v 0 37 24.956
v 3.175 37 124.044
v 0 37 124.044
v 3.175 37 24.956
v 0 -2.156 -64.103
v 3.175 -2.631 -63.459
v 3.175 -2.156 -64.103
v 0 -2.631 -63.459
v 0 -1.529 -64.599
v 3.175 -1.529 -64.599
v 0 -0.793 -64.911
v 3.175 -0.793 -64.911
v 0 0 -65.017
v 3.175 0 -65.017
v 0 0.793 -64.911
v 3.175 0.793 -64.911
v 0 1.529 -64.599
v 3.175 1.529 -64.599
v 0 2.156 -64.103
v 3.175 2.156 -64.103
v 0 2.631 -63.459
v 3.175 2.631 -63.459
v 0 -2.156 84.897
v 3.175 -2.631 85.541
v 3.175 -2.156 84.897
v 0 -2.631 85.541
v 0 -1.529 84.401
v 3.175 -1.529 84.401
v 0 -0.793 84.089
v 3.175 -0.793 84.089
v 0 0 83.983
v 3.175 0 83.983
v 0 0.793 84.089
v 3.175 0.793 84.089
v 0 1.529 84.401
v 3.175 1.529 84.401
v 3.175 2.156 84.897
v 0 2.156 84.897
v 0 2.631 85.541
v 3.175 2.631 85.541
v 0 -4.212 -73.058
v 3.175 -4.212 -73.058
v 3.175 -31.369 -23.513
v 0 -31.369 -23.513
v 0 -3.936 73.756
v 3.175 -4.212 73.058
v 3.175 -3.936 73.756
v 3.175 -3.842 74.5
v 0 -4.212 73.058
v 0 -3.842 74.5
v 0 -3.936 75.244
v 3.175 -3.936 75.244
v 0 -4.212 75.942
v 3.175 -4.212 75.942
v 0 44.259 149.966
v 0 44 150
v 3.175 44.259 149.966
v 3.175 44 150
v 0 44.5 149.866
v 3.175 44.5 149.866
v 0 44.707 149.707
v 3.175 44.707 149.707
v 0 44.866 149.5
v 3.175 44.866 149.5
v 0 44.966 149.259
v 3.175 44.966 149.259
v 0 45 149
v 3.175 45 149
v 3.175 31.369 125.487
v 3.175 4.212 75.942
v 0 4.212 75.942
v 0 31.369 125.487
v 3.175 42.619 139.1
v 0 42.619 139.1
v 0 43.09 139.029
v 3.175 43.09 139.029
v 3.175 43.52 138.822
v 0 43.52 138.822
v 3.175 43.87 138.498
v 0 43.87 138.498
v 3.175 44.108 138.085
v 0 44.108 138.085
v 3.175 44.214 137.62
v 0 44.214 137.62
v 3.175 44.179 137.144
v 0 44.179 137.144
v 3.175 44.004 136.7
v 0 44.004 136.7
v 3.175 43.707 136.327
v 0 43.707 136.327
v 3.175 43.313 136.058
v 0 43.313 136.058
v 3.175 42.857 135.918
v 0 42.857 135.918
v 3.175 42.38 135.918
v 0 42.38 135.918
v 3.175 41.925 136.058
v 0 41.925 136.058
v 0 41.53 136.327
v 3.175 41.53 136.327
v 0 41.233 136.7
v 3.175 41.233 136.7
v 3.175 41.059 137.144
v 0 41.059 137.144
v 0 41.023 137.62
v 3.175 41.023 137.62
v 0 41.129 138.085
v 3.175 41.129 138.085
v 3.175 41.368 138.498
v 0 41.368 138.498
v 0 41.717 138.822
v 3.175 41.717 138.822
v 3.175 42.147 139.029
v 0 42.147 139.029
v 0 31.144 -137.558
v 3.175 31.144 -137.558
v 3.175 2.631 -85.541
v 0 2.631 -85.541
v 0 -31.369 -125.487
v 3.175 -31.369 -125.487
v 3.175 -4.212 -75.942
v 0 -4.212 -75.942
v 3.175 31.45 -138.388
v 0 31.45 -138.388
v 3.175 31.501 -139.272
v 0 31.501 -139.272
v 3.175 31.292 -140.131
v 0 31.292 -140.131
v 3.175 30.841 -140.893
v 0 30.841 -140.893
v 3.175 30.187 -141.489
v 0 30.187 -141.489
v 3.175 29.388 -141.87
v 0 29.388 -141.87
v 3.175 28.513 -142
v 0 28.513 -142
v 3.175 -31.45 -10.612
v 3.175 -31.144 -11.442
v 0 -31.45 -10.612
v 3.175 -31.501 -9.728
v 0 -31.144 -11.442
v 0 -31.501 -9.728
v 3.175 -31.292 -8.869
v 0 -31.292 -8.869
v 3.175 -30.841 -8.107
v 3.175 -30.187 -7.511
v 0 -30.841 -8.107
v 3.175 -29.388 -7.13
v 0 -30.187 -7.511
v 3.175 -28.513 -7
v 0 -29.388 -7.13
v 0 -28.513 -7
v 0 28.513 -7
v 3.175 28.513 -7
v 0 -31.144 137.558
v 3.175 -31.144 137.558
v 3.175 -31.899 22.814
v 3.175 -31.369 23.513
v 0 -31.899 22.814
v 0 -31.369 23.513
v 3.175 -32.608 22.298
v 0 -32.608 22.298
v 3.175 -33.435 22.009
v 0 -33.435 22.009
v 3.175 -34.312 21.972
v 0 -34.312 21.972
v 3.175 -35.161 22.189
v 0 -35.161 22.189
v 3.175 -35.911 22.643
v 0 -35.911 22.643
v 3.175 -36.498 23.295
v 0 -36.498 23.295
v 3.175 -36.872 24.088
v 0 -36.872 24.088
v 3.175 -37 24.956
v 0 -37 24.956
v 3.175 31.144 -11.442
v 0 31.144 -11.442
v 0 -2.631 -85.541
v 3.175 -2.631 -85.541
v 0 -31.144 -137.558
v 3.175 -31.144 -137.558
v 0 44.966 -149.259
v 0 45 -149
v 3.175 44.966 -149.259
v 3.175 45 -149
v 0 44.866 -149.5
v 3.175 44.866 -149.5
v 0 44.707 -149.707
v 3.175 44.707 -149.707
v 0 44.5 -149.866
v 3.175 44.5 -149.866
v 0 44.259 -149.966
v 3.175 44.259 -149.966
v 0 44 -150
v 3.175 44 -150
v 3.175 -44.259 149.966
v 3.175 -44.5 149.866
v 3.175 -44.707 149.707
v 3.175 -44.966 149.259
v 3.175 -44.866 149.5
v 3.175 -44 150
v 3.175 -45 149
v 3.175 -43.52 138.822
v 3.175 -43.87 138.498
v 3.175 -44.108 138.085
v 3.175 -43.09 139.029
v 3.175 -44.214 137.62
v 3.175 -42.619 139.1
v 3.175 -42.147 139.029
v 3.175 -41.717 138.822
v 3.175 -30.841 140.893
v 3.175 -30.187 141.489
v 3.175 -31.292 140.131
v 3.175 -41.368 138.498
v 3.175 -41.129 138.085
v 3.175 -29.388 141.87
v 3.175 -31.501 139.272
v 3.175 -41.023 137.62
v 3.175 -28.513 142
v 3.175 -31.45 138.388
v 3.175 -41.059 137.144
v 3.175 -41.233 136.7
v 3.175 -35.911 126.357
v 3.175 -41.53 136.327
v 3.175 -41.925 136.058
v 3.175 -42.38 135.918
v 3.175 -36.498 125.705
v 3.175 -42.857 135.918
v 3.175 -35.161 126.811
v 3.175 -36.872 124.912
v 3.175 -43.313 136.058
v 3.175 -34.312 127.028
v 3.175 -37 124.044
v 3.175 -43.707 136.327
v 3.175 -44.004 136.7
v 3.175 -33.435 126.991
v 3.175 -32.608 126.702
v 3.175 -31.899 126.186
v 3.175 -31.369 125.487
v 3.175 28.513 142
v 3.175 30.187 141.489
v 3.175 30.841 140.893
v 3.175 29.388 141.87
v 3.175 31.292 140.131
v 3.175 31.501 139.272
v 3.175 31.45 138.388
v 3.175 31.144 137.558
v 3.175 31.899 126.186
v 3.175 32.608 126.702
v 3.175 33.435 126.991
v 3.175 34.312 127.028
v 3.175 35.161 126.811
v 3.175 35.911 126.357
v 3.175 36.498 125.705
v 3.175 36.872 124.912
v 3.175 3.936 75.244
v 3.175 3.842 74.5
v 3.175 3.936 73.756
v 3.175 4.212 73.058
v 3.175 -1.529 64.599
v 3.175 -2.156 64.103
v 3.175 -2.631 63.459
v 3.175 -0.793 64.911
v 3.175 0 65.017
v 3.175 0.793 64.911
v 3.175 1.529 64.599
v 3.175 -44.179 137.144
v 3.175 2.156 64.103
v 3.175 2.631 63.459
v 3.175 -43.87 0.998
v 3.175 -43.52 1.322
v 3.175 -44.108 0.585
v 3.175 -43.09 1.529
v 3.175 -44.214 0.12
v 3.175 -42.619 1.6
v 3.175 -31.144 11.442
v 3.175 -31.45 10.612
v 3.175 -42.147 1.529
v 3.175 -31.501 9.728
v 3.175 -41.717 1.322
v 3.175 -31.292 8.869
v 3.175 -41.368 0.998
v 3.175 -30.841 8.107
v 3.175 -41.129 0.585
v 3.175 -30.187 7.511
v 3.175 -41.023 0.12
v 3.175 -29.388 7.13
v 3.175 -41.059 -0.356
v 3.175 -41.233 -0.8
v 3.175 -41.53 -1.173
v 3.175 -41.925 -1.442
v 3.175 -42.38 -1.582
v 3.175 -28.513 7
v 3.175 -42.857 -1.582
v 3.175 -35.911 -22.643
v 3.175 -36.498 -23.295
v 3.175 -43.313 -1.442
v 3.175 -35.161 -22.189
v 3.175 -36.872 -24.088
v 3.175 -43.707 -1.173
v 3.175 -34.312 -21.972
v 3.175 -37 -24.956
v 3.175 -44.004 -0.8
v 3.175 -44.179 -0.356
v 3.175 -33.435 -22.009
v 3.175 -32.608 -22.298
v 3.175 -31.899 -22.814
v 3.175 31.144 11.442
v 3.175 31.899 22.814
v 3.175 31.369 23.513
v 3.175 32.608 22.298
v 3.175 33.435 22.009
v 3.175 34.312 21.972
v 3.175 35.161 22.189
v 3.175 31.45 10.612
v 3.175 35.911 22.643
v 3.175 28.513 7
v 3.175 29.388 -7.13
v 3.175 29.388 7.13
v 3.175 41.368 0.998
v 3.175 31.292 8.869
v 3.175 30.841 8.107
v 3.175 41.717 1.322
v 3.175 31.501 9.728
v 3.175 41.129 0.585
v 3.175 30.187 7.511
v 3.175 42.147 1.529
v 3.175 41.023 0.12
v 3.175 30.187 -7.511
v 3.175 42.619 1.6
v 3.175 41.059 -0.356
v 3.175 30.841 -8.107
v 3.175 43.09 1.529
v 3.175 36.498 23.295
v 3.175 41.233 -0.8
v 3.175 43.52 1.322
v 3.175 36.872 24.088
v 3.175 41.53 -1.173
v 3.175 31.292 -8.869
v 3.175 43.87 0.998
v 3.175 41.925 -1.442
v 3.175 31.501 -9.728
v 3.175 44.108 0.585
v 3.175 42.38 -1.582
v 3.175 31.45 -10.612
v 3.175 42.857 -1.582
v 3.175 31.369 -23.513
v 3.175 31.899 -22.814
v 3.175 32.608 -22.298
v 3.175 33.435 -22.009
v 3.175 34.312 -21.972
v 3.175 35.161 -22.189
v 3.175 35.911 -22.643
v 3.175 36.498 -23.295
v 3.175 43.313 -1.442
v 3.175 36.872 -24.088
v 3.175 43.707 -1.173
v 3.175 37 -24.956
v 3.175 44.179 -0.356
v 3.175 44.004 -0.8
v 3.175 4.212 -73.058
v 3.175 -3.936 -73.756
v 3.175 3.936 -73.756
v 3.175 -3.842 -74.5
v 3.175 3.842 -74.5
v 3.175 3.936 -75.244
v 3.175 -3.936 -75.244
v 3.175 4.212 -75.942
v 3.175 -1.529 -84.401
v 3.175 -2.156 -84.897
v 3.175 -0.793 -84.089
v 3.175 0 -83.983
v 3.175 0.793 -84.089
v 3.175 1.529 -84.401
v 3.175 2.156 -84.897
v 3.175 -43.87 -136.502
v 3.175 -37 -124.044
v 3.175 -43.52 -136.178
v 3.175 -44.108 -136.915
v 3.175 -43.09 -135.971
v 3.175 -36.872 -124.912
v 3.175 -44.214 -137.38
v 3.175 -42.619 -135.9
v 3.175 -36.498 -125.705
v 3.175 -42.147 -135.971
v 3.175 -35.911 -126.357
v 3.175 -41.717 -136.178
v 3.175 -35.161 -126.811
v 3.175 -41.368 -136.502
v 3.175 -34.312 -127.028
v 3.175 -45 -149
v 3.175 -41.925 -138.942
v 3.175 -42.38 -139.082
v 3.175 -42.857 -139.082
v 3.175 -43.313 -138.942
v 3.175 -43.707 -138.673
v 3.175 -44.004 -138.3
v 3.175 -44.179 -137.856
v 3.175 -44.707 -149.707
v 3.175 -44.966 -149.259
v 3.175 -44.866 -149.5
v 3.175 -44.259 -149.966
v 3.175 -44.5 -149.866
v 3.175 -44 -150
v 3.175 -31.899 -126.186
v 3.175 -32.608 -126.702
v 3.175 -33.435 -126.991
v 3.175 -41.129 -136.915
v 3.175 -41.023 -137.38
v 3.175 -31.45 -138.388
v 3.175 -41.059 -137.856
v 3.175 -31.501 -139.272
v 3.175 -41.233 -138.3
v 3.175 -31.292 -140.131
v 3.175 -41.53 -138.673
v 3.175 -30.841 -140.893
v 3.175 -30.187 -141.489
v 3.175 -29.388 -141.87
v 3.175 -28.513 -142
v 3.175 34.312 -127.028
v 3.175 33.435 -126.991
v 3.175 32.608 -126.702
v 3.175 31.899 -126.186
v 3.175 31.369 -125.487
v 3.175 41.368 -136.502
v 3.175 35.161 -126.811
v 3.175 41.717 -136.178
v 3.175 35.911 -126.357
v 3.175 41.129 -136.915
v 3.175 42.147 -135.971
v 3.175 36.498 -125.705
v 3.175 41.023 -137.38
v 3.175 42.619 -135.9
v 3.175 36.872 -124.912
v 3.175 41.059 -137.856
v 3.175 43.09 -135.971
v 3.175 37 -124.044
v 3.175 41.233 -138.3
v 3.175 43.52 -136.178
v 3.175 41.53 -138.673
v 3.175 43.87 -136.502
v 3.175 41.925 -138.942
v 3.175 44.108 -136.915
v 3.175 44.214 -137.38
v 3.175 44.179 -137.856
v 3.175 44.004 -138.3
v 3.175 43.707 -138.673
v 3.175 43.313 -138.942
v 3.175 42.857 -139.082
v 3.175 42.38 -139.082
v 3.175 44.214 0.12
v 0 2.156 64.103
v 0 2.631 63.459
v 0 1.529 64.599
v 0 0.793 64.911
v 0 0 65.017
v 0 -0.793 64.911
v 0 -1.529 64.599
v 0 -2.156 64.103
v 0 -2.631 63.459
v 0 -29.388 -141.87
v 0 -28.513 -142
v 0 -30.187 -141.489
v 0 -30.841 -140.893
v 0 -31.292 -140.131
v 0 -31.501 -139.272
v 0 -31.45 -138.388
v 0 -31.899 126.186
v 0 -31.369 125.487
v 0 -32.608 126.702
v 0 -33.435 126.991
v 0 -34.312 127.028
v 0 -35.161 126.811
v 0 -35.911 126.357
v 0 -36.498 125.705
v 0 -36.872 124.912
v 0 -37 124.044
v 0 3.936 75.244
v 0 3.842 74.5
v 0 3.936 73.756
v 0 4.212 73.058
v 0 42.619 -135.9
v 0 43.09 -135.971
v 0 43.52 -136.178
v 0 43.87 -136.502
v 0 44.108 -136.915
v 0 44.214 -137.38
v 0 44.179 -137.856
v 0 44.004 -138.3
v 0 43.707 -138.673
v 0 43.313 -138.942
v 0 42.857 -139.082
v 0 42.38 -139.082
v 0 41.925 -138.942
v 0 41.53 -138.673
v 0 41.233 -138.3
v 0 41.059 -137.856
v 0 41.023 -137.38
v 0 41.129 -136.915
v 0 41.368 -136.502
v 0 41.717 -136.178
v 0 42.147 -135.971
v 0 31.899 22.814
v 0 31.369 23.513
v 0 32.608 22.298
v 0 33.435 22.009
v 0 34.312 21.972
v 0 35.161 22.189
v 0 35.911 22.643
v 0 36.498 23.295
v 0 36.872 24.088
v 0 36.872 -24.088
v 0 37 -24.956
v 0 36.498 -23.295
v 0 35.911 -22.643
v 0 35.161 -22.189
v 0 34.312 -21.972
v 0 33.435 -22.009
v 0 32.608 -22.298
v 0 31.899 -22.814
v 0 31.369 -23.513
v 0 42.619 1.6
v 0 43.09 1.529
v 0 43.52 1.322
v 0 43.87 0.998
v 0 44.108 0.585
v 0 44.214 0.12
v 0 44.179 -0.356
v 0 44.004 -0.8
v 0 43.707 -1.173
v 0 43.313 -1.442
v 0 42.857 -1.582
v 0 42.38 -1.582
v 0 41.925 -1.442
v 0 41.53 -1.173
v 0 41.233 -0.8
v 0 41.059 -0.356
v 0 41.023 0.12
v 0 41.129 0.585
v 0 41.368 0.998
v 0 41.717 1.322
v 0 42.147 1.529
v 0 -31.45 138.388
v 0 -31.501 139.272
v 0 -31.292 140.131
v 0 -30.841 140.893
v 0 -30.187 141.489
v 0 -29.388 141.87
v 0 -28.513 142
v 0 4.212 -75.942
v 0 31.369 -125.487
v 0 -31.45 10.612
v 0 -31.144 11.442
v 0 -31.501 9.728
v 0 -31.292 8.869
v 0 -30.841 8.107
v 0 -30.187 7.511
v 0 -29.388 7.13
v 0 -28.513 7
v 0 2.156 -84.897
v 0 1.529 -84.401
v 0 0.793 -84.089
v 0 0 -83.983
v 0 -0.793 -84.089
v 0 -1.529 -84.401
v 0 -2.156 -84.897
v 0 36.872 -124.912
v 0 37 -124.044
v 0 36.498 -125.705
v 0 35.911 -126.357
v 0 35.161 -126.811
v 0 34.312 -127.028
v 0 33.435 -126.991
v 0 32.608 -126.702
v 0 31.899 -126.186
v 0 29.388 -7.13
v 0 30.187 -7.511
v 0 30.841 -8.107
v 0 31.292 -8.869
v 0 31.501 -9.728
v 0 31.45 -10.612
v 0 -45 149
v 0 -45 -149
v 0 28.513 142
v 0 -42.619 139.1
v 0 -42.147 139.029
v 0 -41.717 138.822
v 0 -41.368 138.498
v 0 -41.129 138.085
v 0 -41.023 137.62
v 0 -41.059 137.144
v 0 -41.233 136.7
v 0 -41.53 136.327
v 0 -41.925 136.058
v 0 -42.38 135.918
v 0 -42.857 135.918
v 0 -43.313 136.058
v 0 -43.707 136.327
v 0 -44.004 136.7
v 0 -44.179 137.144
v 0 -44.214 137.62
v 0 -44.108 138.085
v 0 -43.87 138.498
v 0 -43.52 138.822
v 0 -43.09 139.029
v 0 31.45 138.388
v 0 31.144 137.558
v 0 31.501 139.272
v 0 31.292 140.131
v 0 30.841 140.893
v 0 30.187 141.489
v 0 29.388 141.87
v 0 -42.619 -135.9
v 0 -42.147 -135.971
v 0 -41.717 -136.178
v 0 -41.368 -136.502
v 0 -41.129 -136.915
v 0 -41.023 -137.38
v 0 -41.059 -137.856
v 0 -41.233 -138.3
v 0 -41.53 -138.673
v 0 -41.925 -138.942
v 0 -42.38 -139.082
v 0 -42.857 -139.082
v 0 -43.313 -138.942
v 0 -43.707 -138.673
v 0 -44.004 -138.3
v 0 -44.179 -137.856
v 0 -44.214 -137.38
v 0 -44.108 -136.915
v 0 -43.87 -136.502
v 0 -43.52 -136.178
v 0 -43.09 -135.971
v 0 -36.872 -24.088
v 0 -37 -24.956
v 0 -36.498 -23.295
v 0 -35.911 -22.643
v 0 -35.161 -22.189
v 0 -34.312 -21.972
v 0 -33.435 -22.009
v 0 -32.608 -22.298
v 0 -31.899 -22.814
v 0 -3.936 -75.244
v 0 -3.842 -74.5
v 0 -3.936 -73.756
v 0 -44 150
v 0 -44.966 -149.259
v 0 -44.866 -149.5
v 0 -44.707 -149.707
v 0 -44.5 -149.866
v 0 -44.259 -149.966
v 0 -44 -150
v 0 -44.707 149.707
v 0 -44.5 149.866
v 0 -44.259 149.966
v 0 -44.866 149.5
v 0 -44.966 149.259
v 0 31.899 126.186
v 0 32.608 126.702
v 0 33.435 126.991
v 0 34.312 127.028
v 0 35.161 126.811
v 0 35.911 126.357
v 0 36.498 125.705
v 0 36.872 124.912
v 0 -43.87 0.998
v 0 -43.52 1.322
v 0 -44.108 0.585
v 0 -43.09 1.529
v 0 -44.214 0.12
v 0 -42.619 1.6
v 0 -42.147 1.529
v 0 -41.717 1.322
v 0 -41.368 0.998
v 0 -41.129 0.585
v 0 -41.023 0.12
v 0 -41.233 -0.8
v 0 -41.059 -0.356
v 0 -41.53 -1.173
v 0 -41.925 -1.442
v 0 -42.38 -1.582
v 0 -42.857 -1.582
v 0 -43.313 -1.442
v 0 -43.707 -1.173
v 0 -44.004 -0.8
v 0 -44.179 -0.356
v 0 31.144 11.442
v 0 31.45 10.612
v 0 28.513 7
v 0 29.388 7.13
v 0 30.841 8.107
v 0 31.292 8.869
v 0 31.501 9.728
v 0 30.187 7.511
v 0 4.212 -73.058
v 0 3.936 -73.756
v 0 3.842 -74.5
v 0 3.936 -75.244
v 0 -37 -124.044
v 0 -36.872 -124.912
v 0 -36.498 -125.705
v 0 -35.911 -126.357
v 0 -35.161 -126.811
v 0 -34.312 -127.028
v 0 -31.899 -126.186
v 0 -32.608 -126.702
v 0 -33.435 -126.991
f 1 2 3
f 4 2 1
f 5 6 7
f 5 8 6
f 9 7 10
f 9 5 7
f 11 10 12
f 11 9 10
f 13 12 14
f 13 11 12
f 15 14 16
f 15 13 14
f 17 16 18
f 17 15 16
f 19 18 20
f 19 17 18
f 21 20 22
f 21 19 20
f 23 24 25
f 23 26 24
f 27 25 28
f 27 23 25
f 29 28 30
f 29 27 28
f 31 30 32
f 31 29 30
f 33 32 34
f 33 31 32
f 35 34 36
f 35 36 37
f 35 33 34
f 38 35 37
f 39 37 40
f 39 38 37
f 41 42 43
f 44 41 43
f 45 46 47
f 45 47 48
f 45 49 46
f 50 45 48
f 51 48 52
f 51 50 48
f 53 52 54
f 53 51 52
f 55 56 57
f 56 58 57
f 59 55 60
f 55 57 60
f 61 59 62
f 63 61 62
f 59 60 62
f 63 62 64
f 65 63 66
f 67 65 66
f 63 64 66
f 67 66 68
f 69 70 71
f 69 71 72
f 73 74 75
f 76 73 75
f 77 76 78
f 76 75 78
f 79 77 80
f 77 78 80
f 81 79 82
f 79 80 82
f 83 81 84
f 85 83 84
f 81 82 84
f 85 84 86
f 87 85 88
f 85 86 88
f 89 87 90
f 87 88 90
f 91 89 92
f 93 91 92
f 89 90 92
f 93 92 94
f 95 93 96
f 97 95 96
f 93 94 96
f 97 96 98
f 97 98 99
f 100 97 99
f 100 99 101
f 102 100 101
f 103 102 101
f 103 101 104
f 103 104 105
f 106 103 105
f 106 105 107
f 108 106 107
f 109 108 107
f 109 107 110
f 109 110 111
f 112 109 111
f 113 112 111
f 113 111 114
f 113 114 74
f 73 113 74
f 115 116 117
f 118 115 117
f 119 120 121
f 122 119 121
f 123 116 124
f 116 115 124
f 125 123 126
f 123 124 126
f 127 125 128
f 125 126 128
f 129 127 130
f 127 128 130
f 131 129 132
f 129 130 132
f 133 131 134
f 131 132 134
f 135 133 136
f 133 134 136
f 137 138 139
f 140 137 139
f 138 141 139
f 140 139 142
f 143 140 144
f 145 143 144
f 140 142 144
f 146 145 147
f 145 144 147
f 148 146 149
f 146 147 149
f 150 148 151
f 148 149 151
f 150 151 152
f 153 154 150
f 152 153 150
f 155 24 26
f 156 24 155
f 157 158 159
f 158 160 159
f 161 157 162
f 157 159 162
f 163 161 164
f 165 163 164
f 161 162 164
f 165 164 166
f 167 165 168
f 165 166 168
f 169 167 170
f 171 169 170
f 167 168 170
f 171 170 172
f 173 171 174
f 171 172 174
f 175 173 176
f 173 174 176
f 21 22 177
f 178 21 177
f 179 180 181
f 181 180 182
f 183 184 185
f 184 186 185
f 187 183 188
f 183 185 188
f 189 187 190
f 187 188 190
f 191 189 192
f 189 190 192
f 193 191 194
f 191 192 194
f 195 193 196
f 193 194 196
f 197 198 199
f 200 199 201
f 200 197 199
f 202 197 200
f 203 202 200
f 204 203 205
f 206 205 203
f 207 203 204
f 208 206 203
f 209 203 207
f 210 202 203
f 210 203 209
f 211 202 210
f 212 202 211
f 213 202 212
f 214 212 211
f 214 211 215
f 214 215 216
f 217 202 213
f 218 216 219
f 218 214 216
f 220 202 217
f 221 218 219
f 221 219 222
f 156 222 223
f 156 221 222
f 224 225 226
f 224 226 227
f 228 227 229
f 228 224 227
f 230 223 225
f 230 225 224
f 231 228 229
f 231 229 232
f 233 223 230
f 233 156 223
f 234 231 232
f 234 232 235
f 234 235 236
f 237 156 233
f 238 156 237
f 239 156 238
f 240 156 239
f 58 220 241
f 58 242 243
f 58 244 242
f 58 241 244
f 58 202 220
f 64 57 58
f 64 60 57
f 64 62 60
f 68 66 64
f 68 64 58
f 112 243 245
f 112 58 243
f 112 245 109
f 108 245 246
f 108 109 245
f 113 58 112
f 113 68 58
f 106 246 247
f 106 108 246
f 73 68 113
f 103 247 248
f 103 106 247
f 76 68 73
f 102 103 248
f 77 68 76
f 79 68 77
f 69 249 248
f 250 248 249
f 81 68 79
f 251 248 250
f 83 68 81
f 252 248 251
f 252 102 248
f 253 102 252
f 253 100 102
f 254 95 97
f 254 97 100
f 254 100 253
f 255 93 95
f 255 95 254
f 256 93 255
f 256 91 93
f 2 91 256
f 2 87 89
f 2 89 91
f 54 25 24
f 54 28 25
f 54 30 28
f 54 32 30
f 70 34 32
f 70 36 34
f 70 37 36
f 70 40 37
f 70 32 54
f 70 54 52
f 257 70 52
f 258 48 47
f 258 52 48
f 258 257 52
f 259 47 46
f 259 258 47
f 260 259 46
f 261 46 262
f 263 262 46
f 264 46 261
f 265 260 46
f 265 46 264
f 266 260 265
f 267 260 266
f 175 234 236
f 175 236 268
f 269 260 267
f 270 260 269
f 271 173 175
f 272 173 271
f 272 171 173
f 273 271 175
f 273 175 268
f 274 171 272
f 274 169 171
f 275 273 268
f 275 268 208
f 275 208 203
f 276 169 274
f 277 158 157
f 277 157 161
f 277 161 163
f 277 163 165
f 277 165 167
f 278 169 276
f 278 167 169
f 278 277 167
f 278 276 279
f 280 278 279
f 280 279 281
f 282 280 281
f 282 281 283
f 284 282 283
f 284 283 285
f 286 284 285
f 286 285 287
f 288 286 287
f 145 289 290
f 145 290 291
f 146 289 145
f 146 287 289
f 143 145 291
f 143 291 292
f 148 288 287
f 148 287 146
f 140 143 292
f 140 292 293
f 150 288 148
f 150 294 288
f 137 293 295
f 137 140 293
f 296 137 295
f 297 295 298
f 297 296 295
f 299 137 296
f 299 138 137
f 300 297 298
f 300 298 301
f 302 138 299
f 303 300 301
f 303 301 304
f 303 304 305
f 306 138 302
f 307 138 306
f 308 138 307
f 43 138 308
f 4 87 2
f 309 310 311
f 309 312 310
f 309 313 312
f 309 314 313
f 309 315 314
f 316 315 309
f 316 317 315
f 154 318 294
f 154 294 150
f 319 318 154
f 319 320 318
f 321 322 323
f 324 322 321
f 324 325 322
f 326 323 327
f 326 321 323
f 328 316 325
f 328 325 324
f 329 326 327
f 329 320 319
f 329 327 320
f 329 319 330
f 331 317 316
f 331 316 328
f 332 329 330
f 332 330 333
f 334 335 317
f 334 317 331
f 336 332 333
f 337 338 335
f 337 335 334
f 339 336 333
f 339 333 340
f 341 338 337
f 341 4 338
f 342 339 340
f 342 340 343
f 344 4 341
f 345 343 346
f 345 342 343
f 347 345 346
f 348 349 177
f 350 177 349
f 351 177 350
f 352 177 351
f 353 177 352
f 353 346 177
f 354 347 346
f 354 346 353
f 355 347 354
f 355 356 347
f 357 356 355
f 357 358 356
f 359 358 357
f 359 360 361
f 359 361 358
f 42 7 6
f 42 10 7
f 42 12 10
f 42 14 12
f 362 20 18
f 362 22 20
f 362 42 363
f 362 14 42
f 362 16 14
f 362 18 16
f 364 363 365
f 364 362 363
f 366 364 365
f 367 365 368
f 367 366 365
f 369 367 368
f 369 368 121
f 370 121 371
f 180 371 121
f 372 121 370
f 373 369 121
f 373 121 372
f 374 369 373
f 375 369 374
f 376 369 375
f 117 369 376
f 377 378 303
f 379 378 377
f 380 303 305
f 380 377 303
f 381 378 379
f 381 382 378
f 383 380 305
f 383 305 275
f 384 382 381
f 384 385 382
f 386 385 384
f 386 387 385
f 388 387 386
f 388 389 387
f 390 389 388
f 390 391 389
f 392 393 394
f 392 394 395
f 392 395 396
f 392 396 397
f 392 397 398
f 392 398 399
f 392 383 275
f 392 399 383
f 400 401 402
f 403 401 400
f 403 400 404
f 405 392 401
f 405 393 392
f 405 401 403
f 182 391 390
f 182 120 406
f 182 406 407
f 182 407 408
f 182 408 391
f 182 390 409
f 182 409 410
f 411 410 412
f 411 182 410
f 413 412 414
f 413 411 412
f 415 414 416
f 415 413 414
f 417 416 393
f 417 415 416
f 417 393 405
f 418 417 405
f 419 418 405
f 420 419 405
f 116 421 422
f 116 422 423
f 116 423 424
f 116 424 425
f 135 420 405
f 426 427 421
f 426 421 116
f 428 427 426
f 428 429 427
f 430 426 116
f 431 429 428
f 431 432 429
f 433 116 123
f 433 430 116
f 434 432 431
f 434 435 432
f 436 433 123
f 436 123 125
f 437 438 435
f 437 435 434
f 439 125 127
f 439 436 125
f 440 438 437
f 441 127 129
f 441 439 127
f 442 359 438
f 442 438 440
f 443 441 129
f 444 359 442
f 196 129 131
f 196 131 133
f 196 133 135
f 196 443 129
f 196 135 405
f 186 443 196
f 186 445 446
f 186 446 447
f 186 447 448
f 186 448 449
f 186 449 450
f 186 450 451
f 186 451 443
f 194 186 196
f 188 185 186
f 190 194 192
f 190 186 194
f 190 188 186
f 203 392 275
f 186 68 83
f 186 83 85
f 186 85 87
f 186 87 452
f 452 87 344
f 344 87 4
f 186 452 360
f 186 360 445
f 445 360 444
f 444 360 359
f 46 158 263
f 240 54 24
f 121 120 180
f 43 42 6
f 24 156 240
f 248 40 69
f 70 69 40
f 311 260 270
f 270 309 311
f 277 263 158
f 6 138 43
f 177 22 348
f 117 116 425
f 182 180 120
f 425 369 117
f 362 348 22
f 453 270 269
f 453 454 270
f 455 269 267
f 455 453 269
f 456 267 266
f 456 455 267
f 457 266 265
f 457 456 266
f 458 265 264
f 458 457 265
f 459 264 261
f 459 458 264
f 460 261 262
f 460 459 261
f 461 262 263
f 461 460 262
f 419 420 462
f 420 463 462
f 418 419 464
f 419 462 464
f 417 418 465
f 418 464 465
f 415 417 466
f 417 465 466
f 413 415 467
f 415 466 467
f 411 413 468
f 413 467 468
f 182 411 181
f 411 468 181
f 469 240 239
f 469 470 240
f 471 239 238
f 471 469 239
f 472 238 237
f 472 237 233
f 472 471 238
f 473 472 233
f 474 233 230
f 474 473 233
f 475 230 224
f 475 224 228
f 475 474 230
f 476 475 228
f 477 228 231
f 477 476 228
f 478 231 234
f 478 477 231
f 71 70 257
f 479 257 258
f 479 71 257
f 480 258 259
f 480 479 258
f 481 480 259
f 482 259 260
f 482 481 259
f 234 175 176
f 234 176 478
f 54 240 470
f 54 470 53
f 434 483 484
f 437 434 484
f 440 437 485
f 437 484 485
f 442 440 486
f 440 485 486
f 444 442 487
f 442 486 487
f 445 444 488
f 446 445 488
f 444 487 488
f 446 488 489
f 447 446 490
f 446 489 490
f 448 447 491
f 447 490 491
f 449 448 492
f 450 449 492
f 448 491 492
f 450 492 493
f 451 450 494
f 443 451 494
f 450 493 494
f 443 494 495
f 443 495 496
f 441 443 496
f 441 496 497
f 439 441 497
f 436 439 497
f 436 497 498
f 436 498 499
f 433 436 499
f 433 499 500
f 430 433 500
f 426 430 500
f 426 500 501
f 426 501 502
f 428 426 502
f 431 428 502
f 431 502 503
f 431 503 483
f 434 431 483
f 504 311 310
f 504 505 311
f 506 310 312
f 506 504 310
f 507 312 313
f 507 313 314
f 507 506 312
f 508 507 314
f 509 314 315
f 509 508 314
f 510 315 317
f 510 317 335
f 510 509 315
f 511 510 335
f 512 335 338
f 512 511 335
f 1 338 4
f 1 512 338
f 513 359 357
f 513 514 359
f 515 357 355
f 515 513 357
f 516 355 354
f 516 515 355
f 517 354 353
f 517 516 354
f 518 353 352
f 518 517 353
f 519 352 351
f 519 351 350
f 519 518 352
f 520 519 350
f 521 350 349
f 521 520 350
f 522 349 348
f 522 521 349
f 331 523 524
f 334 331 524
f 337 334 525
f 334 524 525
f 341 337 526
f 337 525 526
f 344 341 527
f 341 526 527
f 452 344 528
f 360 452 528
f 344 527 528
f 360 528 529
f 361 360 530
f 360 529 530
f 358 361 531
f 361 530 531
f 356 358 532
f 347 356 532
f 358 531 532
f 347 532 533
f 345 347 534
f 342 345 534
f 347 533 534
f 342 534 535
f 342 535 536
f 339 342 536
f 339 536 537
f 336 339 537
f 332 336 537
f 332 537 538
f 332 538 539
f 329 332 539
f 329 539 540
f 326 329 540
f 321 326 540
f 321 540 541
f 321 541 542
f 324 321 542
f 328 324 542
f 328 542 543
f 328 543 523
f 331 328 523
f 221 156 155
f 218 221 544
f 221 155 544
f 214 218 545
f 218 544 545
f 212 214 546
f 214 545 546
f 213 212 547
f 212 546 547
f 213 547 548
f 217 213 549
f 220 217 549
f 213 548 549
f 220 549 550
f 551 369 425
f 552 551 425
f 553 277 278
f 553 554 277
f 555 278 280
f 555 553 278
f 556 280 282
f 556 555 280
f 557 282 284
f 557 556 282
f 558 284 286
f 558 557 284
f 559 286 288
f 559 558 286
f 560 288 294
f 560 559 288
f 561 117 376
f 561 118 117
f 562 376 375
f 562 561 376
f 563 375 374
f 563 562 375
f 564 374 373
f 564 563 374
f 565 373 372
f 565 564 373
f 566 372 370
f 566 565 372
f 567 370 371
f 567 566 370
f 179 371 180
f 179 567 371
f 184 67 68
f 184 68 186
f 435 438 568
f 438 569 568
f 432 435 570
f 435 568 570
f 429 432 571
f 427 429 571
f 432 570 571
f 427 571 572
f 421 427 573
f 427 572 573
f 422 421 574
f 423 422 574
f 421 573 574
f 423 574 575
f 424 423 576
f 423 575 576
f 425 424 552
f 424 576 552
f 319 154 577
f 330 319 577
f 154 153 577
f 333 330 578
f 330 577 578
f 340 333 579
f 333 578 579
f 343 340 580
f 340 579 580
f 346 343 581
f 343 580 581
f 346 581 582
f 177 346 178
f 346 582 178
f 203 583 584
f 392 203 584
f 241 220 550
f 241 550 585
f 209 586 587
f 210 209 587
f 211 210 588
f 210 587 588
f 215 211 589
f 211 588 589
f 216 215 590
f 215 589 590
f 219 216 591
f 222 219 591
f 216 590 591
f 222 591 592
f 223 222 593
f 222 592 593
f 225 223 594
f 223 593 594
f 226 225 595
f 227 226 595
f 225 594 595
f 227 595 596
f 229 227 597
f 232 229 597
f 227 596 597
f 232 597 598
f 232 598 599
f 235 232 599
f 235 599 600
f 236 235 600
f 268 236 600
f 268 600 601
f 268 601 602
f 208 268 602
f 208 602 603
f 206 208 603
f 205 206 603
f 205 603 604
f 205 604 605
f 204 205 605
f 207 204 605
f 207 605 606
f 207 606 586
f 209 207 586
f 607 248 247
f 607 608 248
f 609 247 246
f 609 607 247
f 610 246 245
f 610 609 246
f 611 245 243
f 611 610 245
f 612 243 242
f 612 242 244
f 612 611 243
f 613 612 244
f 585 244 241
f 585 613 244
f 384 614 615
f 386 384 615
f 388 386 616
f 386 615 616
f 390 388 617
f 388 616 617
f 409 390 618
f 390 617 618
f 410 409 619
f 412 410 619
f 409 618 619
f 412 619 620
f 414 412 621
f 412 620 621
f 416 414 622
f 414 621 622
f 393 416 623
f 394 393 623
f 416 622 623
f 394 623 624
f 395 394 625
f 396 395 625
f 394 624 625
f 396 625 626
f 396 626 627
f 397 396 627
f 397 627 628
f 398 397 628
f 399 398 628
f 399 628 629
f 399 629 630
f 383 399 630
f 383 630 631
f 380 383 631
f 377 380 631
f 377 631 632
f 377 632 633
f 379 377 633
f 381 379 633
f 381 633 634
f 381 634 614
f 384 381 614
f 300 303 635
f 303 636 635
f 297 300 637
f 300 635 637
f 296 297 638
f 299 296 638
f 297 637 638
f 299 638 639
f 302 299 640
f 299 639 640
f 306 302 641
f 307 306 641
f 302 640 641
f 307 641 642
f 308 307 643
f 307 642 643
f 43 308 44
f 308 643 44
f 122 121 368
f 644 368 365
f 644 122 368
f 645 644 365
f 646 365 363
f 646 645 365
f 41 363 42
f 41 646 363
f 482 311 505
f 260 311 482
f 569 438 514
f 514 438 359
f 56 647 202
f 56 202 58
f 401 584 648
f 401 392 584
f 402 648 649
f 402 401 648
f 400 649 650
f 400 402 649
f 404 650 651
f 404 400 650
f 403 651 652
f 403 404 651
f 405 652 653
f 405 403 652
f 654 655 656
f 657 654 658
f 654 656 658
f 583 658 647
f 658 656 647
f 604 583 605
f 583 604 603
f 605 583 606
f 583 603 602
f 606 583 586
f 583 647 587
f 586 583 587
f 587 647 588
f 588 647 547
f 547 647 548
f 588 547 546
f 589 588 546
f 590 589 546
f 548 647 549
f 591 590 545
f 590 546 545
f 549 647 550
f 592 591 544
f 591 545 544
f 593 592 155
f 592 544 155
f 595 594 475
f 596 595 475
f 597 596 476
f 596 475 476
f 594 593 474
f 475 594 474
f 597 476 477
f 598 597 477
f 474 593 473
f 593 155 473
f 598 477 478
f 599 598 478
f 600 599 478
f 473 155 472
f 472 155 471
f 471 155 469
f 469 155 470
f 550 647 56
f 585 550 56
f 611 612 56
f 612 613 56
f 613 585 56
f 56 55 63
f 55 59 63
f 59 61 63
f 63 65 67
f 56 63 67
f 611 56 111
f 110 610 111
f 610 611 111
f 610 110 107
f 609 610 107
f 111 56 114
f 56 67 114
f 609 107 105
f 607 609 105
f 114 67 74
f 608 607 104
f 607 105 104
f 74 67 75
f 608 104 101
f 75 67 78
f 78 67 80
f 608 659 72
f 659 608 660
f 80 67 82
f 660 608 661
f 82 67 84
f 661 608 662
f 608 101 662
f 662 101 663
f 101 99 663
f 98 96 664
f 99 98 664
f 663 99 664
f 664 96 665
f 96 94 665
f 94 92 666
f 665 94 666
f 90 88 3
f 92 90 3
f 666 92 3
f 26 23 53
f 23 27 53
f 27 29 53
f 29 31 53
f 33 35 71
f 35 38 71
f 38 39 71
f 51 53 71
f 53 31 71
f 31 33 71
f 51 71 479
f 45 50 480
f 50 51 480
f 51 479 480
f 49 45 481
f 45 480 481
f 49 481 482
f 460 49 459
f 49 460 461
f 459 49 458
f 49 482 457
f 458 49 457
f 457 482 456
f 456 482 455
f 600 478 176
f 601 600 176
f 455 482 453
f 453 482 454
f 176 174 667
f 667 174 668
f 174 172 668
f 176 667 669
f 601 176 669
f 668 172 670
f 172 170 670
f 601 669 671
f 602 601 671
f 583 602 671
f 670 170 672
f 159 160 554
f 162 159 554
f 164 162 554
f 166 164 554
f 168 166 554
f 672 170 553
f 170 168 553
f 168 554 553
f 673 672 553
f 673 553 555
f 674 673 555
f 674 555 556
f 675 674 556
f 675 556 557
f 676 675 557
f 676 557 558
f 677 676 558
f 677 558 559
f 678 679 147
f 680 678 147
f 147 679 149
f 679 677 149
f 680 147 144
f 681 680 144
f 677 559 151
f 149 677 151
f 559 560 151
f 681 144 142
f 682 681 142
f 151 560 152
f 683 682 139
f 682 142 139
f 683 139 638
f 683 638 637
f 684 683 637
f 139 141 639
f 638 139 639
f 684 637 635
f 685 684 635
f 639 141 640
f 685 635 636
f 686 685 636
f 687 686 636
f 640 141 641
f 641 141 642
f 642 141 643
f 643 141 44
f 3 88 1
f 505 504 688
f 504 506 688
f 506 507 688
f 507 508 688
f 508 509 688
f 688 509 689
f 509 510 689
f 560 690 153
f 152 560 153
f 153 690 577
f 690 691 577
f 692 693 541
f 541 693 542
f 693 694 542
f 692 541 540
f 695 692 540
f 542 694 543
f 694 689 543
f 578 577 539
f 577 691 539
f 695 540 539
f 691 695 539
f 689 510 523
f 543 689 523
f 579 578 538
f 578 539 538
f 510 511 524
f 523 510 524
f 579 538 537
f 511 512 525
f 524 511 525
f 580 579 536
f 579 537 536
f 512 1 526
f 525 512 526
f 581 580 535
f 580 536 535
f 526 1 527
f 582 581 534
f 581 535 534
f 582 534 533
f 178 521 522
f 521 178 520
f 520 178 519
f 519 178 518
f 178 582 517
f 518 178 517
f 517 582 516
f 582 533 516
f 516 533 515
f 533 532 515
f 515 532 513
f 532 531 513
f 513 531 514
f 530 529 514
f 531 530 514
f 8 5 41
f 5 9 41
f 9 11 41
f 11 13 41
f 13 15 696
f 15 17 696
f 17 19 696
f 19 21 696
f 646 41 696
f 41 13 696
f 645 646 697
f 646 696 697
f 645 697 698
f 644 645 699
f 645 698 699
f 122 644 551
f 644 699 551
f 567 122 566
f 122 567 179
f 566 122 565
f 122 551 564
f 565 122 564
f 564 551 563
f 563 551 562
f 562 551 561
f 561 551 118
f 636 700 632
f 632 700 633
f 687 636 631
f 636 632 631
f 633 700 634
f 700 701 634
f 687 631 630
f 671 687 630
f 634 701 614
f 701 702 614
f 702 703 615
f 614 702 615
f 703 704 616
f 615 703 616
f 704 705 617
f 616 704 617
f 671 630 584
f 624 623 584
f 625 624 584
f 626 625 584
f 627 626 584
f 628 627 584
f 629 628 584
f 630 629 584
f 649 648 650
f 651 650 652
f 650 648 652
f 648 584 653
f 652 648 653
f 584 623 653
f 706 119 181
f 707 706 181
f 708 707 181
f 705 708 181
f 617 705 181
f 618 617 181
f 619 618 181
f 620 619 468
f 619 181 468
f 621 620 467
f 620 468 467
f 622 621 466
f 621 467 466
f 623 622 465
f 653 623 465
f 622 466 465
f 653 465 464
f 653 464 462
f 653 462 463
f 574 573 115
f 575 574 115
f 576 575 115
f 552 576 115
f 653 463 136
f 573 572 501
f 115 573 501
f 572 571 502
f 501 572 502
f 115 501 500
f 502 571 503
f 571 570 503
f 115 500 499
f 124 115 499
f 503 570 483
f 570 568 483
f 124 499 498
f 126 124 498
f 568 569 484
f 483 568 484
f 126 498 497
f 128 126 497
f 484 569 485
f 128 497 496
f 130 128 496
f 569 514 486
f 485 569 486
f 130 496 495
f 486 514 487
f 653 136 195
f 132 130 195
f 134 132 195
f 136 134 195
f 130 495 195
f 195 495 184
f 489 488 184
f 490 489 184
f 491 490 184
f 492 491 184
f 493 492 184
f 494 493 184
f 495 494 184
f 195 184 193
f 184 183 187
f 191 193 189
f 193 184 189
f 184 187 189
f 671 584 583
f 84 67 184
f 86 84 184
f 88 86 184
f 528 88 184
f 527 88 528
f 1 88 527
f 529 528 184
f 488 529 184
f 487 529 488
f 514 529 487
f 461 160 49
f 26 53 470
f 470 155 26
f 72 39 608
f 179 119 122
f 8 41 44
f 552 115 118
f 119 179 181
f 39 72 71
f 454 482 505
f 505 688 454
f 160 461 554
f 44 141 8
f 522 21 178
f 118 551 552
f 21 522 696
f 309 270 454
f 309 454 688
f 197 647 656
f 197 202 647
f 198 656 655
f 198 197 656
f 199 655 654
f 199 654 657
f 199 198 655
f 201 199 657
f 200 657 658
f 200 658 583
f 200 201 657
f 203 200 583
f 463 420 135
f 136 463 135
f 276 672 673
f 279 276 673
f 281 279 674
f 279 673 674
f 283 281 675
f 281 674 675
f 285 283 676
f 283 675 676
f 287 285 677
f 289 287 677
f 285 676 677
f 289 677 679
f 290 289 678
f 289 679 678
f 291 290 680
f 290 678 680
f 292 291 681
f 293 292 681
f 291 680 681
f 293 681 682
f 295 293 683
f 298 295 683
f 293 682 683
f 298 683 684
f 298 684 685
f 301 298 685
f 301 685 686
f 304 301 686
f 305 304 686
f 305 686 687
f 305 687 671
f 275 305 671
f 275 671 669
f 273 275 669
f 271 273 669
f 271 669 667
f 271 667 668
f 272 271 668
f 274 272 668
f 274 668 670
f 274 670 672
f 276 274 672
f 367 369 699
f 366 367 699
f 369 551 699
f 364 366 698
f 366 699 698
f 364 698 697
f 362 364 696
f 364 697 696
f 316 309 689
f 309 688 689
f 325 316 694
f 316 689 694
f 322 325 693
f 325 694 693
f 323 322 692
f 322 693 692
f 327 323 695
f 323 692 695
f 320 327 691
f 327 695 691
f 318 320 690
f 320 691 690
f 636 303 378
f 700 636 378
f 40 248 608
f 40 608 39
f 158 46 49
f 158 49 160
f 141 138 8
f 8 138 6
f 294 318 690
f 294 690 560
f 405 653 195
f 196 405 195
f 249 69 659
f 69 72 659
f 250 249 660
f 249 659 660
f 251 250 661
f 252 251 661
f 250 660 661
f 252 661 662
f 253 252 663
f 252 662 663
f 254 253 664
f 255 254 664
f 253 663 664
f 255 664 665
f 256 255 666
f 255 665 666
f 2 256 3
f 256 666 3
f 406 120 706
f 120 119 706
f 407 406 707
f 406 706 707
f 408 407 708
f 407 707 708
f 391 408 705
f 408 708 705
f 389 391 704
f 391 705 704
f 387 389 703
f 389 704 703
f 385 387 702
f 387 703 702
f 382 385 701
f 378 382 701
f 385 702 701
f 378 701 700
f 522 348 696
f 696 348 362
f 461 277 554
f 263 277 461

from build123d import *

# Parameters (mm, degrees)
SKETCH2_W            = 300
SKETCH2_H            = 90
BOSS_EXTRUDE1_DEPTH  = 3.175
CUT_EXTRUDE2_DEPTH   = 157.636779286
M3_CLEARANCE_HOLE1_D = 3.2
FILLET1_R            = 3
FILLET2_R            = 1


with BuildPart() as part:
    # Sketch2 → Boss-Extrude1 (new body)
    with BuildSketch(Plane(origin=(0, 0, 0), x_dir=(0, 0, -1), z_dir=(1, 0, 0))):
        Rectangle(SKETCH2_W, SKETCH2_H)
    extrude(amount=BOSS_EXTRUDE1_DEPTH)

    # Sketch4 → Cut-Extrude2 (cut, through all)
    with BuildSketch(Plane(origin=(3.175, 0, 0), x_dir=(0, 0, -1), z_dir=(1, 0, 0))):
        Polygon((-135.758731446, 37), (-13.241268554, 37), (-74.5, 3.4211398), align=None)
        Polygon((-7, 33.5788602), (-7, -33.5788602), (-68.258731446, 0), align=None)
        Polygon((-13.241268554, -37), (-135.758731446, -37), (-74.5, -3.4211398), align=None)
        Polygon((-142, -33.5788602), (-142, 33.5788602), (-80.741268554, 0), align=None)
        Polygon((135.758731446, 37), (13.241268554, 37), (74.5, 3.4211398), align=None)
        Polygon((142, 33.5788602), (80.741268554, 0), (142, -33.5788602), align=None)
        Polygon((135.758731446, -37), (74.5, -3.4211398), (13.241268554, -37), align=None)
        Polygon((7, -33.5788602), (68.258731446, 0), (7, 33.5788602), align=None)
    extrude(amount=-CUT_EXTRUDE2_DEPTH, mode=Mode.SUBTRACT)

    # M3 Clearance Hole1 (through all)
    with Locations(Plane(origin=(3.175, 0, 0), x_dir=(0, 0, -1), z_dir=(1, 0, 0))):
        with Locations((-137.5, 42.61875), (137.5, 42.61875), (137.5, -42.61875), (-137.5, -42.61875), (0, 42.61875), (0, -42.61875)):
            Hole(M3_CLEARANCE_HOLE1_D / 2)

    # Fillet1
    fillet1_edges = [part.edges().sort_by_distance(p)[0] for p in [
        (1.5875, 37, -135.758731446),
        (1.5875, 3.4211398, -74.5),
        (1.5875, 37, -13.241268554),
        (1.5875, 0, 80.741268554),
        (1.5875, -33.5788602, 142),
        (1.5875, 33.5788602, 142),
        (1.5875, 0, 68.258731446),
        (1.5875, 33.5788602, 7),
        (1.5875, -33.5788602, 7),
        (1.5875, -3.4211398, 74.5),
        (1.5875, -37, 13.241268554),
        (1.5875, -37, 135.758731446),
        (1.5875, -33.5788602, -7),
        (1.5875, 33.5788602, -7),
        (1.5875, 0, -68.258731446),
        (1.5875, 33.5788602, -142),
        (1.5875, -33.5788602, -142),
        (1.5875, 0, -80.741268554),
        (1.5875, -37, -135.758731446),
        (1.5875, -37, -13.241268554),
        (1.5875, -3.4211398, -74.5),
        (1.5875, 3.4211398, 74.5),
        (1.5875, 37, 135.758731446),
        (1.5875, 37, 13.241268554),
    ]]
    fillet(fillet1_edges, radius=FILLET1_R)

    # Fillet2
    fillet2_edges = [part.edges().sort_by_distance(p)[0] for p in [
        (1.5875, -45, -150),
        (1.5875, -45, 150),
        (1.5875, 45, 150),
        (1.5875, 45, -150),
    ]]
    fillet(fillet2_edges, radius=FILLET2_R)


solid = part.part
